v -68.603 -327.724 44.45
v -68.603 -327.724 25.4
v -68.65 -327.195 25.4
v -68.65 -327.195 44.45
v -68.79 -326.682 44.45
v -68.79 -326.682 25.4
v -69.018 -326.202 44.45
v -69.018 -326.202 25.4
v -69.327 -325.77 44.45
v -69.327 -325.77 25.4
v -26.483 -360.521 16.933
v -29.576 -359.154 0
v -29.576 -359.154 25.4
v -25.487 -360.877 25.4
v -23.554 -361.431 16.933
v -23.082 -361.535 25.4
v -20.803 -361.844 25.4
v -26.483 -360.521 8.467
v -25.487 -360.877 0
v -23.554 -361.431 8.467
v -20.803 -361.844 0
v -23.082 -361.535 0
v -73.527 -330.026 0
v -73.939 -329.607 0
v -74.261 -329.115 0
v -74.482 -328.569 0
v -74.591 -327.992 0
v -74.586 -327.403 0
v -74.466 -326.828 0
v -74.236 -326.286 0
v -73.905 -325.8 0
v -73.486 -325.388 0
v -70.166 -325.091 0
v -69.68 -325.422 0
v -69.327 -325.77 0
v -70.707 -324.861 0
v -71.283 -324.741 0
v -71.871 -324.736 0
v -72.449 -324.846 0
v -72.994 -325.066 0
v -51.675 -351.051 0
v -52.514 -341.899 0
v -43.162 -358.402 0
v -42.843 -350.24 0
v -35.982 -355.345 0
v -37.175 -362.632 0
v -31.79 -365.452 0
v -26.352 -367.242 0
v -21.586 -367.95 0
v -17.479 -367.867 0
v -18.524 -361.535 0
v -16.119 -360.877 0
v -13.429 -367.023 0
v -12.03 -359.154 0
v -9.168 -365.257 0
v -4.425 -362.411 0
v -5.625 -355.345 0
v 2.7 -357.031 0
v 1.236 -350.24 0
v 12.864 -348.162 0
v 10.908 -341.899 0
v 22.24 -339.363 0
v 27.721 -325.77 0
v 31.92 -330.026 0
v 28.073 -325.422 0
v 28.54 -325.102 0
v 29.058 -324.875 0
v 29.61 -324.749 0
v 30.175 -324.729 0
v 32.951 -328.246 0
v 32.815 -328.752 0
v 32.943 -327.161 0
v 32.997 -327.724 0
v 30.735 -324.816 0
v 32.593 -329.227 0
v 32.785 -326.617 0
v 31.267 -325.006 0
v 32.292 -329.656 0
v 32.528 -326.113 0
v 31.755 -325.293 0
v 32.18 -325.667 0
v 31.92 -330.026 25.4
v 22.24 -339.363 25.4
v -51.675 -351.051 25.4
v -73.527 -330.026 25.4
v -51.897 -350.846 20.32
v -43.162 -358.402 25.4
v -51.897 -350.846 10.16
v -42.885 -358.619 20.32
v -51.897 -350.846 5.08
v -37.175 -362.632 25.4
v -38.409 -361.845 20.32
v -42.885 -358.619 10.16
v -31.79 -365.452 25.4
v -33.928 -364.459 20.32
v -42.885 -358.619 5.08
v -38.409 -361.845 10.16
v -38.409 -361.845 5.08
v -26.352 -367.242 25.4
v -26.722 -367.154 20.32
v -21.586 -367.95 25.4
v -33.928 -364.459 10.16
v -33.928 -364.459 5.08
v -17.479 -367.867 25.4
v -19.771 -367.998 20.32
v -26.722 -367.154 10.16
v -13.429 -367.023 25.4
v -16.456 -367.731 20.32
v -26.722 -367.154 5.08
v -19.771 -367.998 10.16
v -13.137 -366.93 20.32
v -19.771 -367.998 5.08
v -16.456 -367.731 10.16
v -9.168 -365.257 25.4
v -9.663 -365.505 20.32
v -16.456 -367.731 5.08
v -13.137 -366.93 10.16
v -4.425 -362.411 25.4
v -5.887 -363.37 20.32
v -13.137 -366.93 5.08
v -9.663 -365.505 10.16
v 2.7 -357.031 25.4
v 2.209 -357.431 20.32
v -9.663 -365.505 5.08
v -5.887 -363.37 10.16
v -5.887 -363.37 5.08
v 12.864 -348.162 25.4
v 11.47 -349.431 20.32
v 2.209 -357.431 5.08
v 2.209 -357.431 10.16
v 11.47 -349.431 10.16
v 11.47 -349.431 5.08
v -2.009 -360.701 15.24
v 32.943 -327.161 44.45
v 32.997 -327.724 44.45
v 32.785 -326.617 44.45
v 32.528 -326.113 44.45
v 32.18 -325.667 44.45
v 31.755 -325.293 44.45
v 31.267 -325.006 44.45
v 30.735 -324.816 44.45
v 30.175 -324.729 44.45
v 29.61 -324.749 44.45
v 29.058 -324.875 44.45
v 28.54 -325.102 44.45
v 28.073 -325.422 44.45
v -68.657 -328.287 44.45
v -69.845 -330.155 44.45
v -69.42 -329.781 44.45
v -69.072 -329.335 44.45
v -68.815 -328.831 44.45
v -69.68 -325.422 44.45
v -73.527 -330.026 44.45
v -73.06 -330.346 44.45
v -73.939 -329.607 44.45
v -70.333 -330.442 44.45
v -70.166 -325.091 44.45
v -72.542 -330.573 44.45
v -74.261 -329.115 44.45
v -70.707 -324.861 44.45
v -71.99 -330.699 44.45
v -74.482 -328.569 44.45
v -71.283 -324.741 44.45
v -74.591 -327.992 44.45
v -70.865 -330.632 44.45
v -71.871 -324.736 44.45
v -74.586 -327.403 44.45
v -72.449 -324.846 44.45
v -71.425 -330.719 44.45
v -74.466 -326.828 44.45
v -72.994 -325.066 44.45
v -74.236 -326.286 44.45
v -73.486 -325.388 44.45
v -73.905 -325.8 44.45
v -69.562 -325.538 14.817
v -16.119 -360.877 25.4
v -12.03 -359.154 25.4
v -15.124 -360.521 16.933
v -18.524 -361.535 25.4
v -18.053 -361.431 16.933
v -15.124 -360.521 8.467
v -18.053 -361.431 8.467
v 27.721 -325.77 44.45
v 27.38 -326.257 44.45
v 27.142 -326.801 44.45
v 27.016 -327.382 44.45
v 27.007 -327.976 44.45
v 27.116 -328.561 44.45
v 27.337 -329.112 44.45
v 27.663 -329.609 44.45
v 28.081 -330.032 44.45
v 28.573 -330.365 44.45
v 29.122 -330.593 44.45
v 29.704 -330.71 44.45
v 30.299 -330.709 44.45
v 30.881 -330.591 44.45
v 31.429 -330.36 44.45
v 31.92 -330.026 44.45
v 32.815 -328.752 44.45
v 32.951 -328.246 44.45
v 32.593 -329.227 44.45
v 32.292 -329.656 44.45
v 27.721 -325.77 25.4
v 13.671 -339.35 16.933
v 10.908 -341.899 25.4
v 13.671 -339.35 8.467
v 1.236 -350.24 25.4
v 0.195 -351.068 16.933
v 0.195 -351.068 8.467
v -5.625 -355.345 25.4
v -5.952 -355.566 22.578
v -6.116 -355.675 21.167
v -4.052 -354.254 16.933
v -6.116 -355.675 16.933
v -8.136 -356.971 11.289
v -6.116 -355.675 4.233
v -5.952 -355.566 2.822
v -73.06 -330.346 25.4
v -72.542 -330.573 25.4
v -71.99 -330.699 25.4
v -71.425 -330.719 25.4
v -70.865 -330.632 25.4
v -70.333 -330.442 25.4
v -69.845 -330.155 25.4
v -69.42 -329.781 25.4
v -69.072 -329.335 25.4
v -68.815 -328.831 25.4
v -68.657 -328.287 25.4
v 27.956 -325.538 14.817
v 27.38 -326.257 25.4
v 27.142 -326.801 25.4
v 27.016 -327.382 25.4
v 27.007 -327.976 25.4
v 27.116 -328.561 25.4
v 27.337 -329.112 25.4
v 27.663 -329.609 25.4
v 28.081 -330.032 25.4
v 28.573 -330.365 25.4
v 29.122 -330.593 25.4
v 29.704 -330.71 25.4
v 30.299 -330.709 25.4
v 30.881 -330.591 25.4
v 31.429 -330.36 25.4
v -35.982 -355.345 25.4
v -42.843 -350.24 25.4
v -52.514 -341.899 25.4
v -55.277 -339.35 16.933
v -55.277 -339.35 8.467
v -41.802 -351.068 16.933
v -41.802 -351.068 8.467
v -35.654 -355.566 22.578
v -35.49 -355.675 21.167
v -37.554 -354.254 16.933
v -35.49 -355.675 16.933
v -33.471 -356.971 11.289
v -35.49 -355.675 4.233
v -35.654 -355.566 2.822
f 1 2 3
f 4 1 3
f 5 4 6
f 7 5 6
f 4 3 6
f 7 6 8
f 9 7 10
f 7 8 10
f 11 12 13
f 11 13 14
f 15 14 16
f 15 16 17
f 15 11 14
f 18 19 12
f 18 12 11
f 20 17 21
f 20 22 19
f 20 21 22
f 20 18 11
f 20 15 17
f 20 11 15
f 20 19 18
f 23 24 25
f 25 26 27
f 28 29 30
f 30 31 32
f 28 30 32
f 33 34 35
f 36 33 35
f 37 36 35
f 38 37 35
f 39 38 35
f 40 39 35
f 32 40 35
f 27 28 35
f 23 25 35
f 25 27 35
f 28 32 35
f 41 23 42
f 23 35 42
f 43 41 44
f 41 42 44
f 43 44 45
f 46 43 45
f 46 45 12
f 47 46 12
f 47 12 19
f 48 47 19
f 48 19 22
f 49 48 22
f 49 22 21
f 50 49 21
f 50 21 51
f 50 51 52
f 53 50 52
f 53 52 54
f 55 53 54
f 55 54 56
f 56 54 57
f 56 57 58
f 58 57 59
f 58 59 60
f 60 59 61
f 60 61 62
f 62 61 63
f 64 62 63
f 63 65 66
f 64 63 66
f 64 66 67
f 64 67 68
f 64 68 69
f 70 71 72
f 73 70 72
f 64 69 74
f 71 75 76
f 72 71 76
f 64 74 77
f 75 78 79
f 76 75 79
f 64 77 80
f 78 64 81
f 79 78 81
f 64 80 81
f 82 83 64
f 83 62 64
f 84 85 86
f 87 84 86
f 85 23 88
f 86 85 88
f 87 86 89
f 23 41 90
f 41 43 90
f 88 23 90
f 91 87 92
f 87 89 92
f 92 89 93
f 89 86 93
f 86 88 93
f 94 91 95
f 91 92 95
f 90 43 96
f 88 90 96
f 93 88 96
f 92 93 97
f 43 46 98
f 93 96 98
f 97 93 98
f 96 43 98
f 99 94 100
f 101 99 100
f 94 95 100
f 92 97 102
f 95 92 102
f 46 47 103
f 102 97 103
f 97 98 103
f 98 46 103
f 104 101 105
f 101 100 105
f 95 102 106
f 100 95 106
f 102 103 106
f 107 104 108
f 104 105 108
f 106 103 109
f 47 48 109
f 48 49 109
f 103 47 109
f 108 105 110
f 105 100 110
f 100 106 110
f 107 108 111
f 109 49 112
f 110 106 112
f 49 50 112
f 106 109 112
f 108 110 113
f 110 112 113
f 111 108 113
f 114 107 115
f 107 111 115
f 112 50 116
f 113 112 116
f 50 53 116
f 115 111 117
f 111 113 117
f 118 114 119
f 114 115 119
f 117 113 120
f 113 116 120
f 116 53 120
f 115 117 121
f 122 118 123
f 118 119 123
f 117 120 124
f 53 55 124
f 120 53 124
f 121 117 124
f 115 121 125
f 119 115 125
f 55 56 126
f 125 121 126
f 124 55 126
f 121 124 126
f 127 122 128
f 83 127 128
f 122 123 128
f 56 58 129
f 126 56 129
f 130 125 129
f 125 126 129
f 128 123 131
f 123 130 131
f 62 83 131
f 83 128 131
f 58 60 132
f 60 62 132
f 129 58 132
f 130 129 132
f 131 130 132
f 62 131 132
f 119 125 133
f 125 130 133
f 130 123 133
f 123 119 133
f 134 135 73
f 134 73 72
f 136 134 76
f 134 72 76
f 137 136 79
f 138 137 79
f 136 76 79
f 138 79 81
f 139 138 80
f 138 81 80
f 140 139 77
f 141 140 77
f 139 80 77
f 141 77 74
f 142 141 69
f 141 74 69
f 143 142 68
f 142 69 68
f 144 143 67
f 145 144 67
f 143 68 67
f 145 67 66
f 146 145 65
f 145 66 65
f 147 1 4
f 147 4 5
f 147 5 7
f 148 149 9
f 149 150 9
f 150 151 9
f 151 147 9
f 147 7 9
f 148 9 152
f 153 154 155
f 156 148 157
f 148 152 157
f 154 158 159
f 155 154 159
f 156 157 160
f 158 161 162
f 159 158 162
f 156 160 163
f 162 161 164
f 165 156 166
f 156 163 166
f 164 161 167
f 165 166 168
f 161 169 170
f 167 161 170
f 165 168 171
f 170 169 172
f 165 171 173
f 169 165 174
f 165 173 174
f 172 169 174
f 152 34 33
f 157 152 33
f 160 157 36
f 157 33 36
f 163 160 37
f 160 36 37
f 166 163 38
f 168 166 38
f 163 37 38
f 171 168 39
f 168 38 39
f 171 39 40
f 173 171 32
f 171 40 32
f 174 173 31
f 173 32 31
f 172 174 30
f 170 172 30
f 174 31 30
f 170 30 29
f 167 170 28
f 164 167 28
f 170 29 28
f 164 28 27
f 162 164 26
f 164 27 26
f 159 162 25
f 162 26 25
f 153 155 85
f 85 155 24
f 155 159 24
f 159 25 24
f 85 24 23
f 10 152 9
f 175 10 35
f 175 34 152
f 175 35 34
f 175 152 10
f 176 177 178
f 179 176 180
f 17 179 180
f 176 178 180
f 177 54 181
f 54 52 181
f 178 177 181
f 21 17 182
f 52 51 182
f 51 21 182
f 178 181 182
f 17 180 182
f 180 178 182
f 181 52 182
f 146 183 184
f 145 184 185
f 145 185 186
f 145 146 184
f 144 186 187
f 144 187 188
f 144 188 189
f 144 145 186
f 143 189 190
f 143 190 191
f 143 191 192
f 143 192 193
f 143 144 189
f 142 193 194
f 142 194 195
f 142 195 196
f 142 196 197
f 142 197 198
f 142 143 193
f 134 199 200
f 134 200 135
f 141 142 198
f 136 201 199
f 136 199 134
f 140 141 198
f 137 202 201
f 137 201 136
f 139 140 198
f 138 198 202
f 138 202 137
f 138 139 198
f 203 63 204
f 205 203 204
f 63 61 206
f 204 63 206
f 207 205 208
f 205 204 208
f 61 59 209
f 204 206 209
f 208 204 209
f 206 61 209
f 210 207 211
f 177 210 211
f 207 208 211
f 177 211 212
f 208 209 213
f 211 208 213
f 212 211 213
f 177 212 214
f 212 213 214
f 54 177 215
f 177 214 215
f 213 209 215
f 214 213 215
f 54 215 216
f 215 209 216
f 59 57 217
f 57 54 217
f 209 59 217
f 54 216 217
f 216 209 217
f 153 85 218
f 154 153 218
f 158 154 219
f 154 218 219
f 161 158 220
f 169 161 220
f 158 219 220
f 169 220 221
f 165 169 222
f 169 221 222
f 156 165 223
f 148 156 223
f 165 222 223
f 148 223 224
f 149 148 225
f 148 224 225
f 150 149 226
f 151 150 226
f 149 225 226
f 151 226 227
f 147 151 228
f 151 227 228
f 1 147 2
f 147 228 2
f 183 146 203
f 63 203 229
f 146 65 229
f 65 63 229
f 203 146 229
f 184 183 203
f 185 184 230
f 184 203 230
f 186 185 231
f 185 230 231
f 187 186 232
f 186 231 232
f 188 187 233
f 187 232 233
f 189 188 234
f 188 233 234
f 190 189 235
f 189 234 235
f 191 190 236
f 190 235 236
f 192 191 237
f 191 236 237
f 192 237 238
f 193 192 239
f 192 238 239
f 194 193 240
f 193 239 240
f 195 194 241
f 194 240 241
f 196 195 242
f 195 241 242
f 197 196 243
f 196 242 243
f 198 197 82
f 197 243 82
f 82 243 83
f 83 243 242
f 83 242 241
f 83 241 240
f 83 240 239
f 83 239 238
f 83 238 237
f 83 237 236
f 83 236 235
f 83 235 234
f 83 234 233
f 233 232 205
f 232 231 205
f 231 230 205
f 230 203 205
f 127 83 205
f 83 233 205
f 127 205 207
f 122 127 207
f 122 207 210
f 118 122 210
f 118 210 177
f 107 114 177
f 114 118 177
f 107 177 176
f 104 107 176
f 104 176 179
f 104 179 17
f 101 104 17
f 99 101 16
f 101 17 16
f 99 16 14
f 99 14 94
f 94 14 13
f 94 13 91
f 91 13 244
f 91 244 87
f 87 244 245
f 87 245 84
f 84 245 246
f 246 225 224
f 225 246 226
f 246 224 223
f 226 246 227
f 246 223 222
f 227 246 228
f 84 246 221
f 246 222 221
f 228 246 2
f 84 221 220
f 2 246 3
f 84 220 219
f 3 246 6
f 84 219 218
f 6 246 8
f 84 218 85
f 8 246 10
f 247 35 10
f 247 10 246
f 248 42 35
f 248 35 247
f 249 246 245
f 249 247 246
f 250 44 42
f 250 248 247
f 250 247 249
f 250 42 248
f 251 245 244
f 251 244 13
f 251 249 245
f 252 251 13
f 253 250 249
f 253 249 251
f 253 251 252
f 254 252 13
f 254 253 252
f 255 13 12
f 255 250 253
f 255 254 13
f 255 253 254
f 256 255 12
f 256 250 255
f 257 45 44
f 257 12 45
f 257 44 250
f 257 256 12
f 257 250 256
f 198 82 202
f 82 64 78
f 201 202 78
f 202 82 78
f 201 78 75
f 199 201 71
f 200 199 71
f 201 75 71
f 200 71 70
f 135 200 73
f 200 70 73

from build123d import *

# Parameters (mm, degrees)
F1_DEPTH = 25.4
F2_DEPTH = 44.45


with BuildPart() as f1:
    # F0 (on Top) → F1 (new body)
    with BuildSketch(Plane.XY):
        with BuildLine():
            add(Edge.make_bspline(
                [(-69.3271539599, -325.7695472874), (-55.2144738249, -339.6916032797), (-40.9515430368, -353.4727855932), (-29.5761530725, -359.1538975577)],
                knots=[0.0032973847, 0.0032973847, 0.0032973847, 0.0032973847, 0.3994432353, 0.3994432353, 0.3994432353, 0.3994432353], degree=3))
            ThreePointArc((-69.3271539599, -325.7695472874), (-68.78999079, -326.6818588732), (-68.6031813399, -327.7239524054))
            ThreePointArc((-68.6031813399, -327.7239524054), (-70.3325433699, -330.4415762111), (-73.526834106, -330.0260297359))
            add(Edge.make_bspline(
                [(-73.526834106, -330.0260297359), (-66.0785739485, -337.1329239072), (-52.6651672252, -350.675327591), (-35.1539032994, -365.4603452904), (-19.3791270617, -369.1866054653), (-3.5859872539, -364.4497262422), (17.9527958908, -343.5527557441), (31.9204714261, -330.0260297359)],
                knots=[0, 0, 0, 0, 0.2194100194, 0.4095312642, 0.5624979229, 0.7156903508, 1, 1, 1, 1], degree=3))
            ThreePointArc((31.9204714261, -330.0260297359), (27.8612970199, -329.8309757381), (27.72079128, -325.7695472874))
            add(Edge.make_bspline(
                [(27.72079128, -325.7695472874), (13.608111145, -339.6916032798), (-0.6548196431, -353.4727855932), (-12.0302096074, -359.1538975577)],
                knots=[0.0032973847, 0.0032973847, 0.0032973847, 0.0032973847, 0.3994432353, 0.3994432353, 0.3994432353, 0.3994432353], degree=3))
            add(Edge.make_bspline(
                [(-20.8031813399, -361.8441262888), (-20.6461461246, -361.8531475586), (-17.281131215, -361.9872858015), (-14.3941104944, -360.8015328656), (-12.0302096074, -359.1538975577)],
                knots=[0.5098577732, 0.5098577732, 0.5098577732, 0.5098577732, 0.5163856275, 0.6506484057, 0.6506484057, 0.6506484057, 0.6506484057], degree=3))
            add(Edge.make_bspline(
                [(-20.8031813399, -361.8441262888), (-20.9602165553, -361.8531475586), (-24.3252314649, -361.9872858015), (-27.2122521855, -360.8015328656), (-29.5761530725, -359.1538975577)],
                knots=[0.5098577732, 0.5098577732, 0.5098577732, 0.5098577732, 0.5163856275, 0.6506484057, 0.6506484057, 0.6506484057, 0.6506484057], degree=3))
        make_face()
        with BuildLine():
            add(Edge.make_bspline(
                [(-29.5761530725, -359.1538975577), (-26.4055823726, -360.7373480762), (-23.4593329293, -361.6915372024), (-20.8031813399, -361.8441262888)],
                knots=[0.3994432353, 0.3994432353, 0.3994432353, 0.3994432353, 0.5098577732, 0.5098577732, 0.5098577732, 0.5098577732], degree=3))
            add(Edge.make_bspline(
                [(-20.8031813399, -361.8441262888), (-20.9602165553, -361.8531475586), (-24.3252314649, -361.9872858015), (-27.2122521855, -360.8015328656), (-29.5761530725, -359.1538975577)],
                knots=[0.5098577732, 0.5098577732, 0.5098577732, 0.5098577732, 0.5163856275, 0.6506484057, 0.6506484057, 0.6506484057, 0.6506484057], degree=3))
        make_face()
        with BuildLine():
            add(Edge.make_bspline(
                [(-12.0302096074, -359.1538975577), (-15.2007803073, -360.7373480762), (-18.1470297506, -361.6915372024), (-20.8031813399, -361.8441262888)],
                knots=[0.3994432353, 0.3994432353, 0.3994432353, 0.3994432353, 0.5098577732, 0.5098577732, 0.5098577732, 0.5098577732], degree=3))
            add(Edge.make_bspline(
                [(-20.8031813399, -361.8441262888), (-20.6461461246, -361.8531475586), (-17.281131215, -361.9872858015), (-14.3941104944, -360.8015328656), (-12.0302096074, -359.1538975577)],
                knots=[0.5098577732, 0.5098577732, 0.5098577732, 0.5098577732, 0.5163856275, 0.6506484057, 0.6506484057, 0.6506484057, 0.6506484057], degree=3))
        make_face()
    extrude(amount=F1_DEPTH)

    # F0 (on Top) → F2 (join)
    with BuildSketch(Plane.XY):
        with BuildLine():
            Line((28.073165894, -325.4218750749), (31.9204714261, -330.0260297359))
            ThreePointArc((31.9204714261, -330.0260297359), (32.7144424657, -328.9945903755), (32.9968186601, -327.7239524054))
            ThreePointArc((32.9968186601, -327.7239524054), (31.2674566301, -325.0063285998), (28.073165894, -325.4218750749))
        make_face()
        with BuildLine():
            ThreePointArc((27.72079128, -325.7695472874), (27.8612970199, -329.8309757381), (31.9204714261, -330.0260297359))
            Line((31.9204714261, -330.0260297359), (28.073165894, -325.4218750749))
            add(Edge.make_bspline(
                [(28.073165894, -325.4218750749), (27.9557192671, -325.5377725126), (27.8382604785, -325.6536647801), (27.72079128, -325.7695472874)],
                knots=[0, 0, 0, 0, 0.0032973847, 0.0032973847, 0.0032973847, 0.0032973847], degree=3))
        make_face()
        with BuildLine():
            add(Edge.make_bspline(
                [(-69.6795285739, -325.4218750749), (-69.562081947, -325.5377725126), (-69.4446231584, -325.6536647801), (-69.3271539599, -325.7695472874)],
                knots=[0, 0, 0, 0, 0.0032973847, 0.0032973847, 0.0032973847, 0.0032973847], degree=3))
            Line((-69.6795285739, -325.4218750749), (-73.526834106, -330.0260297359))
            ThreePointArc((-73.526834106, -330.0260297359), (-70.3325433699, -330.4415762111), (-68.6031813399, -327.7239524054))
            ThreePointArc((-68.6031813399, -327.7239524054), (-68.78999079, -326.6818588732), (-69.3271539599, -325.7695472874))
        make_face()
        with BuildLine():
            Line((-73.526834106, -330.0260297359), (-69.6795285739, -325.4218750749))
            ThreePointArc((-69.6795285739, -325.4218750749), (-73.9052586704, -325.8002996394), (-73.526834106, -330.0260297359))
        make_face()
    extrude(amount=F2_DEPTH)


solid = f1.part
